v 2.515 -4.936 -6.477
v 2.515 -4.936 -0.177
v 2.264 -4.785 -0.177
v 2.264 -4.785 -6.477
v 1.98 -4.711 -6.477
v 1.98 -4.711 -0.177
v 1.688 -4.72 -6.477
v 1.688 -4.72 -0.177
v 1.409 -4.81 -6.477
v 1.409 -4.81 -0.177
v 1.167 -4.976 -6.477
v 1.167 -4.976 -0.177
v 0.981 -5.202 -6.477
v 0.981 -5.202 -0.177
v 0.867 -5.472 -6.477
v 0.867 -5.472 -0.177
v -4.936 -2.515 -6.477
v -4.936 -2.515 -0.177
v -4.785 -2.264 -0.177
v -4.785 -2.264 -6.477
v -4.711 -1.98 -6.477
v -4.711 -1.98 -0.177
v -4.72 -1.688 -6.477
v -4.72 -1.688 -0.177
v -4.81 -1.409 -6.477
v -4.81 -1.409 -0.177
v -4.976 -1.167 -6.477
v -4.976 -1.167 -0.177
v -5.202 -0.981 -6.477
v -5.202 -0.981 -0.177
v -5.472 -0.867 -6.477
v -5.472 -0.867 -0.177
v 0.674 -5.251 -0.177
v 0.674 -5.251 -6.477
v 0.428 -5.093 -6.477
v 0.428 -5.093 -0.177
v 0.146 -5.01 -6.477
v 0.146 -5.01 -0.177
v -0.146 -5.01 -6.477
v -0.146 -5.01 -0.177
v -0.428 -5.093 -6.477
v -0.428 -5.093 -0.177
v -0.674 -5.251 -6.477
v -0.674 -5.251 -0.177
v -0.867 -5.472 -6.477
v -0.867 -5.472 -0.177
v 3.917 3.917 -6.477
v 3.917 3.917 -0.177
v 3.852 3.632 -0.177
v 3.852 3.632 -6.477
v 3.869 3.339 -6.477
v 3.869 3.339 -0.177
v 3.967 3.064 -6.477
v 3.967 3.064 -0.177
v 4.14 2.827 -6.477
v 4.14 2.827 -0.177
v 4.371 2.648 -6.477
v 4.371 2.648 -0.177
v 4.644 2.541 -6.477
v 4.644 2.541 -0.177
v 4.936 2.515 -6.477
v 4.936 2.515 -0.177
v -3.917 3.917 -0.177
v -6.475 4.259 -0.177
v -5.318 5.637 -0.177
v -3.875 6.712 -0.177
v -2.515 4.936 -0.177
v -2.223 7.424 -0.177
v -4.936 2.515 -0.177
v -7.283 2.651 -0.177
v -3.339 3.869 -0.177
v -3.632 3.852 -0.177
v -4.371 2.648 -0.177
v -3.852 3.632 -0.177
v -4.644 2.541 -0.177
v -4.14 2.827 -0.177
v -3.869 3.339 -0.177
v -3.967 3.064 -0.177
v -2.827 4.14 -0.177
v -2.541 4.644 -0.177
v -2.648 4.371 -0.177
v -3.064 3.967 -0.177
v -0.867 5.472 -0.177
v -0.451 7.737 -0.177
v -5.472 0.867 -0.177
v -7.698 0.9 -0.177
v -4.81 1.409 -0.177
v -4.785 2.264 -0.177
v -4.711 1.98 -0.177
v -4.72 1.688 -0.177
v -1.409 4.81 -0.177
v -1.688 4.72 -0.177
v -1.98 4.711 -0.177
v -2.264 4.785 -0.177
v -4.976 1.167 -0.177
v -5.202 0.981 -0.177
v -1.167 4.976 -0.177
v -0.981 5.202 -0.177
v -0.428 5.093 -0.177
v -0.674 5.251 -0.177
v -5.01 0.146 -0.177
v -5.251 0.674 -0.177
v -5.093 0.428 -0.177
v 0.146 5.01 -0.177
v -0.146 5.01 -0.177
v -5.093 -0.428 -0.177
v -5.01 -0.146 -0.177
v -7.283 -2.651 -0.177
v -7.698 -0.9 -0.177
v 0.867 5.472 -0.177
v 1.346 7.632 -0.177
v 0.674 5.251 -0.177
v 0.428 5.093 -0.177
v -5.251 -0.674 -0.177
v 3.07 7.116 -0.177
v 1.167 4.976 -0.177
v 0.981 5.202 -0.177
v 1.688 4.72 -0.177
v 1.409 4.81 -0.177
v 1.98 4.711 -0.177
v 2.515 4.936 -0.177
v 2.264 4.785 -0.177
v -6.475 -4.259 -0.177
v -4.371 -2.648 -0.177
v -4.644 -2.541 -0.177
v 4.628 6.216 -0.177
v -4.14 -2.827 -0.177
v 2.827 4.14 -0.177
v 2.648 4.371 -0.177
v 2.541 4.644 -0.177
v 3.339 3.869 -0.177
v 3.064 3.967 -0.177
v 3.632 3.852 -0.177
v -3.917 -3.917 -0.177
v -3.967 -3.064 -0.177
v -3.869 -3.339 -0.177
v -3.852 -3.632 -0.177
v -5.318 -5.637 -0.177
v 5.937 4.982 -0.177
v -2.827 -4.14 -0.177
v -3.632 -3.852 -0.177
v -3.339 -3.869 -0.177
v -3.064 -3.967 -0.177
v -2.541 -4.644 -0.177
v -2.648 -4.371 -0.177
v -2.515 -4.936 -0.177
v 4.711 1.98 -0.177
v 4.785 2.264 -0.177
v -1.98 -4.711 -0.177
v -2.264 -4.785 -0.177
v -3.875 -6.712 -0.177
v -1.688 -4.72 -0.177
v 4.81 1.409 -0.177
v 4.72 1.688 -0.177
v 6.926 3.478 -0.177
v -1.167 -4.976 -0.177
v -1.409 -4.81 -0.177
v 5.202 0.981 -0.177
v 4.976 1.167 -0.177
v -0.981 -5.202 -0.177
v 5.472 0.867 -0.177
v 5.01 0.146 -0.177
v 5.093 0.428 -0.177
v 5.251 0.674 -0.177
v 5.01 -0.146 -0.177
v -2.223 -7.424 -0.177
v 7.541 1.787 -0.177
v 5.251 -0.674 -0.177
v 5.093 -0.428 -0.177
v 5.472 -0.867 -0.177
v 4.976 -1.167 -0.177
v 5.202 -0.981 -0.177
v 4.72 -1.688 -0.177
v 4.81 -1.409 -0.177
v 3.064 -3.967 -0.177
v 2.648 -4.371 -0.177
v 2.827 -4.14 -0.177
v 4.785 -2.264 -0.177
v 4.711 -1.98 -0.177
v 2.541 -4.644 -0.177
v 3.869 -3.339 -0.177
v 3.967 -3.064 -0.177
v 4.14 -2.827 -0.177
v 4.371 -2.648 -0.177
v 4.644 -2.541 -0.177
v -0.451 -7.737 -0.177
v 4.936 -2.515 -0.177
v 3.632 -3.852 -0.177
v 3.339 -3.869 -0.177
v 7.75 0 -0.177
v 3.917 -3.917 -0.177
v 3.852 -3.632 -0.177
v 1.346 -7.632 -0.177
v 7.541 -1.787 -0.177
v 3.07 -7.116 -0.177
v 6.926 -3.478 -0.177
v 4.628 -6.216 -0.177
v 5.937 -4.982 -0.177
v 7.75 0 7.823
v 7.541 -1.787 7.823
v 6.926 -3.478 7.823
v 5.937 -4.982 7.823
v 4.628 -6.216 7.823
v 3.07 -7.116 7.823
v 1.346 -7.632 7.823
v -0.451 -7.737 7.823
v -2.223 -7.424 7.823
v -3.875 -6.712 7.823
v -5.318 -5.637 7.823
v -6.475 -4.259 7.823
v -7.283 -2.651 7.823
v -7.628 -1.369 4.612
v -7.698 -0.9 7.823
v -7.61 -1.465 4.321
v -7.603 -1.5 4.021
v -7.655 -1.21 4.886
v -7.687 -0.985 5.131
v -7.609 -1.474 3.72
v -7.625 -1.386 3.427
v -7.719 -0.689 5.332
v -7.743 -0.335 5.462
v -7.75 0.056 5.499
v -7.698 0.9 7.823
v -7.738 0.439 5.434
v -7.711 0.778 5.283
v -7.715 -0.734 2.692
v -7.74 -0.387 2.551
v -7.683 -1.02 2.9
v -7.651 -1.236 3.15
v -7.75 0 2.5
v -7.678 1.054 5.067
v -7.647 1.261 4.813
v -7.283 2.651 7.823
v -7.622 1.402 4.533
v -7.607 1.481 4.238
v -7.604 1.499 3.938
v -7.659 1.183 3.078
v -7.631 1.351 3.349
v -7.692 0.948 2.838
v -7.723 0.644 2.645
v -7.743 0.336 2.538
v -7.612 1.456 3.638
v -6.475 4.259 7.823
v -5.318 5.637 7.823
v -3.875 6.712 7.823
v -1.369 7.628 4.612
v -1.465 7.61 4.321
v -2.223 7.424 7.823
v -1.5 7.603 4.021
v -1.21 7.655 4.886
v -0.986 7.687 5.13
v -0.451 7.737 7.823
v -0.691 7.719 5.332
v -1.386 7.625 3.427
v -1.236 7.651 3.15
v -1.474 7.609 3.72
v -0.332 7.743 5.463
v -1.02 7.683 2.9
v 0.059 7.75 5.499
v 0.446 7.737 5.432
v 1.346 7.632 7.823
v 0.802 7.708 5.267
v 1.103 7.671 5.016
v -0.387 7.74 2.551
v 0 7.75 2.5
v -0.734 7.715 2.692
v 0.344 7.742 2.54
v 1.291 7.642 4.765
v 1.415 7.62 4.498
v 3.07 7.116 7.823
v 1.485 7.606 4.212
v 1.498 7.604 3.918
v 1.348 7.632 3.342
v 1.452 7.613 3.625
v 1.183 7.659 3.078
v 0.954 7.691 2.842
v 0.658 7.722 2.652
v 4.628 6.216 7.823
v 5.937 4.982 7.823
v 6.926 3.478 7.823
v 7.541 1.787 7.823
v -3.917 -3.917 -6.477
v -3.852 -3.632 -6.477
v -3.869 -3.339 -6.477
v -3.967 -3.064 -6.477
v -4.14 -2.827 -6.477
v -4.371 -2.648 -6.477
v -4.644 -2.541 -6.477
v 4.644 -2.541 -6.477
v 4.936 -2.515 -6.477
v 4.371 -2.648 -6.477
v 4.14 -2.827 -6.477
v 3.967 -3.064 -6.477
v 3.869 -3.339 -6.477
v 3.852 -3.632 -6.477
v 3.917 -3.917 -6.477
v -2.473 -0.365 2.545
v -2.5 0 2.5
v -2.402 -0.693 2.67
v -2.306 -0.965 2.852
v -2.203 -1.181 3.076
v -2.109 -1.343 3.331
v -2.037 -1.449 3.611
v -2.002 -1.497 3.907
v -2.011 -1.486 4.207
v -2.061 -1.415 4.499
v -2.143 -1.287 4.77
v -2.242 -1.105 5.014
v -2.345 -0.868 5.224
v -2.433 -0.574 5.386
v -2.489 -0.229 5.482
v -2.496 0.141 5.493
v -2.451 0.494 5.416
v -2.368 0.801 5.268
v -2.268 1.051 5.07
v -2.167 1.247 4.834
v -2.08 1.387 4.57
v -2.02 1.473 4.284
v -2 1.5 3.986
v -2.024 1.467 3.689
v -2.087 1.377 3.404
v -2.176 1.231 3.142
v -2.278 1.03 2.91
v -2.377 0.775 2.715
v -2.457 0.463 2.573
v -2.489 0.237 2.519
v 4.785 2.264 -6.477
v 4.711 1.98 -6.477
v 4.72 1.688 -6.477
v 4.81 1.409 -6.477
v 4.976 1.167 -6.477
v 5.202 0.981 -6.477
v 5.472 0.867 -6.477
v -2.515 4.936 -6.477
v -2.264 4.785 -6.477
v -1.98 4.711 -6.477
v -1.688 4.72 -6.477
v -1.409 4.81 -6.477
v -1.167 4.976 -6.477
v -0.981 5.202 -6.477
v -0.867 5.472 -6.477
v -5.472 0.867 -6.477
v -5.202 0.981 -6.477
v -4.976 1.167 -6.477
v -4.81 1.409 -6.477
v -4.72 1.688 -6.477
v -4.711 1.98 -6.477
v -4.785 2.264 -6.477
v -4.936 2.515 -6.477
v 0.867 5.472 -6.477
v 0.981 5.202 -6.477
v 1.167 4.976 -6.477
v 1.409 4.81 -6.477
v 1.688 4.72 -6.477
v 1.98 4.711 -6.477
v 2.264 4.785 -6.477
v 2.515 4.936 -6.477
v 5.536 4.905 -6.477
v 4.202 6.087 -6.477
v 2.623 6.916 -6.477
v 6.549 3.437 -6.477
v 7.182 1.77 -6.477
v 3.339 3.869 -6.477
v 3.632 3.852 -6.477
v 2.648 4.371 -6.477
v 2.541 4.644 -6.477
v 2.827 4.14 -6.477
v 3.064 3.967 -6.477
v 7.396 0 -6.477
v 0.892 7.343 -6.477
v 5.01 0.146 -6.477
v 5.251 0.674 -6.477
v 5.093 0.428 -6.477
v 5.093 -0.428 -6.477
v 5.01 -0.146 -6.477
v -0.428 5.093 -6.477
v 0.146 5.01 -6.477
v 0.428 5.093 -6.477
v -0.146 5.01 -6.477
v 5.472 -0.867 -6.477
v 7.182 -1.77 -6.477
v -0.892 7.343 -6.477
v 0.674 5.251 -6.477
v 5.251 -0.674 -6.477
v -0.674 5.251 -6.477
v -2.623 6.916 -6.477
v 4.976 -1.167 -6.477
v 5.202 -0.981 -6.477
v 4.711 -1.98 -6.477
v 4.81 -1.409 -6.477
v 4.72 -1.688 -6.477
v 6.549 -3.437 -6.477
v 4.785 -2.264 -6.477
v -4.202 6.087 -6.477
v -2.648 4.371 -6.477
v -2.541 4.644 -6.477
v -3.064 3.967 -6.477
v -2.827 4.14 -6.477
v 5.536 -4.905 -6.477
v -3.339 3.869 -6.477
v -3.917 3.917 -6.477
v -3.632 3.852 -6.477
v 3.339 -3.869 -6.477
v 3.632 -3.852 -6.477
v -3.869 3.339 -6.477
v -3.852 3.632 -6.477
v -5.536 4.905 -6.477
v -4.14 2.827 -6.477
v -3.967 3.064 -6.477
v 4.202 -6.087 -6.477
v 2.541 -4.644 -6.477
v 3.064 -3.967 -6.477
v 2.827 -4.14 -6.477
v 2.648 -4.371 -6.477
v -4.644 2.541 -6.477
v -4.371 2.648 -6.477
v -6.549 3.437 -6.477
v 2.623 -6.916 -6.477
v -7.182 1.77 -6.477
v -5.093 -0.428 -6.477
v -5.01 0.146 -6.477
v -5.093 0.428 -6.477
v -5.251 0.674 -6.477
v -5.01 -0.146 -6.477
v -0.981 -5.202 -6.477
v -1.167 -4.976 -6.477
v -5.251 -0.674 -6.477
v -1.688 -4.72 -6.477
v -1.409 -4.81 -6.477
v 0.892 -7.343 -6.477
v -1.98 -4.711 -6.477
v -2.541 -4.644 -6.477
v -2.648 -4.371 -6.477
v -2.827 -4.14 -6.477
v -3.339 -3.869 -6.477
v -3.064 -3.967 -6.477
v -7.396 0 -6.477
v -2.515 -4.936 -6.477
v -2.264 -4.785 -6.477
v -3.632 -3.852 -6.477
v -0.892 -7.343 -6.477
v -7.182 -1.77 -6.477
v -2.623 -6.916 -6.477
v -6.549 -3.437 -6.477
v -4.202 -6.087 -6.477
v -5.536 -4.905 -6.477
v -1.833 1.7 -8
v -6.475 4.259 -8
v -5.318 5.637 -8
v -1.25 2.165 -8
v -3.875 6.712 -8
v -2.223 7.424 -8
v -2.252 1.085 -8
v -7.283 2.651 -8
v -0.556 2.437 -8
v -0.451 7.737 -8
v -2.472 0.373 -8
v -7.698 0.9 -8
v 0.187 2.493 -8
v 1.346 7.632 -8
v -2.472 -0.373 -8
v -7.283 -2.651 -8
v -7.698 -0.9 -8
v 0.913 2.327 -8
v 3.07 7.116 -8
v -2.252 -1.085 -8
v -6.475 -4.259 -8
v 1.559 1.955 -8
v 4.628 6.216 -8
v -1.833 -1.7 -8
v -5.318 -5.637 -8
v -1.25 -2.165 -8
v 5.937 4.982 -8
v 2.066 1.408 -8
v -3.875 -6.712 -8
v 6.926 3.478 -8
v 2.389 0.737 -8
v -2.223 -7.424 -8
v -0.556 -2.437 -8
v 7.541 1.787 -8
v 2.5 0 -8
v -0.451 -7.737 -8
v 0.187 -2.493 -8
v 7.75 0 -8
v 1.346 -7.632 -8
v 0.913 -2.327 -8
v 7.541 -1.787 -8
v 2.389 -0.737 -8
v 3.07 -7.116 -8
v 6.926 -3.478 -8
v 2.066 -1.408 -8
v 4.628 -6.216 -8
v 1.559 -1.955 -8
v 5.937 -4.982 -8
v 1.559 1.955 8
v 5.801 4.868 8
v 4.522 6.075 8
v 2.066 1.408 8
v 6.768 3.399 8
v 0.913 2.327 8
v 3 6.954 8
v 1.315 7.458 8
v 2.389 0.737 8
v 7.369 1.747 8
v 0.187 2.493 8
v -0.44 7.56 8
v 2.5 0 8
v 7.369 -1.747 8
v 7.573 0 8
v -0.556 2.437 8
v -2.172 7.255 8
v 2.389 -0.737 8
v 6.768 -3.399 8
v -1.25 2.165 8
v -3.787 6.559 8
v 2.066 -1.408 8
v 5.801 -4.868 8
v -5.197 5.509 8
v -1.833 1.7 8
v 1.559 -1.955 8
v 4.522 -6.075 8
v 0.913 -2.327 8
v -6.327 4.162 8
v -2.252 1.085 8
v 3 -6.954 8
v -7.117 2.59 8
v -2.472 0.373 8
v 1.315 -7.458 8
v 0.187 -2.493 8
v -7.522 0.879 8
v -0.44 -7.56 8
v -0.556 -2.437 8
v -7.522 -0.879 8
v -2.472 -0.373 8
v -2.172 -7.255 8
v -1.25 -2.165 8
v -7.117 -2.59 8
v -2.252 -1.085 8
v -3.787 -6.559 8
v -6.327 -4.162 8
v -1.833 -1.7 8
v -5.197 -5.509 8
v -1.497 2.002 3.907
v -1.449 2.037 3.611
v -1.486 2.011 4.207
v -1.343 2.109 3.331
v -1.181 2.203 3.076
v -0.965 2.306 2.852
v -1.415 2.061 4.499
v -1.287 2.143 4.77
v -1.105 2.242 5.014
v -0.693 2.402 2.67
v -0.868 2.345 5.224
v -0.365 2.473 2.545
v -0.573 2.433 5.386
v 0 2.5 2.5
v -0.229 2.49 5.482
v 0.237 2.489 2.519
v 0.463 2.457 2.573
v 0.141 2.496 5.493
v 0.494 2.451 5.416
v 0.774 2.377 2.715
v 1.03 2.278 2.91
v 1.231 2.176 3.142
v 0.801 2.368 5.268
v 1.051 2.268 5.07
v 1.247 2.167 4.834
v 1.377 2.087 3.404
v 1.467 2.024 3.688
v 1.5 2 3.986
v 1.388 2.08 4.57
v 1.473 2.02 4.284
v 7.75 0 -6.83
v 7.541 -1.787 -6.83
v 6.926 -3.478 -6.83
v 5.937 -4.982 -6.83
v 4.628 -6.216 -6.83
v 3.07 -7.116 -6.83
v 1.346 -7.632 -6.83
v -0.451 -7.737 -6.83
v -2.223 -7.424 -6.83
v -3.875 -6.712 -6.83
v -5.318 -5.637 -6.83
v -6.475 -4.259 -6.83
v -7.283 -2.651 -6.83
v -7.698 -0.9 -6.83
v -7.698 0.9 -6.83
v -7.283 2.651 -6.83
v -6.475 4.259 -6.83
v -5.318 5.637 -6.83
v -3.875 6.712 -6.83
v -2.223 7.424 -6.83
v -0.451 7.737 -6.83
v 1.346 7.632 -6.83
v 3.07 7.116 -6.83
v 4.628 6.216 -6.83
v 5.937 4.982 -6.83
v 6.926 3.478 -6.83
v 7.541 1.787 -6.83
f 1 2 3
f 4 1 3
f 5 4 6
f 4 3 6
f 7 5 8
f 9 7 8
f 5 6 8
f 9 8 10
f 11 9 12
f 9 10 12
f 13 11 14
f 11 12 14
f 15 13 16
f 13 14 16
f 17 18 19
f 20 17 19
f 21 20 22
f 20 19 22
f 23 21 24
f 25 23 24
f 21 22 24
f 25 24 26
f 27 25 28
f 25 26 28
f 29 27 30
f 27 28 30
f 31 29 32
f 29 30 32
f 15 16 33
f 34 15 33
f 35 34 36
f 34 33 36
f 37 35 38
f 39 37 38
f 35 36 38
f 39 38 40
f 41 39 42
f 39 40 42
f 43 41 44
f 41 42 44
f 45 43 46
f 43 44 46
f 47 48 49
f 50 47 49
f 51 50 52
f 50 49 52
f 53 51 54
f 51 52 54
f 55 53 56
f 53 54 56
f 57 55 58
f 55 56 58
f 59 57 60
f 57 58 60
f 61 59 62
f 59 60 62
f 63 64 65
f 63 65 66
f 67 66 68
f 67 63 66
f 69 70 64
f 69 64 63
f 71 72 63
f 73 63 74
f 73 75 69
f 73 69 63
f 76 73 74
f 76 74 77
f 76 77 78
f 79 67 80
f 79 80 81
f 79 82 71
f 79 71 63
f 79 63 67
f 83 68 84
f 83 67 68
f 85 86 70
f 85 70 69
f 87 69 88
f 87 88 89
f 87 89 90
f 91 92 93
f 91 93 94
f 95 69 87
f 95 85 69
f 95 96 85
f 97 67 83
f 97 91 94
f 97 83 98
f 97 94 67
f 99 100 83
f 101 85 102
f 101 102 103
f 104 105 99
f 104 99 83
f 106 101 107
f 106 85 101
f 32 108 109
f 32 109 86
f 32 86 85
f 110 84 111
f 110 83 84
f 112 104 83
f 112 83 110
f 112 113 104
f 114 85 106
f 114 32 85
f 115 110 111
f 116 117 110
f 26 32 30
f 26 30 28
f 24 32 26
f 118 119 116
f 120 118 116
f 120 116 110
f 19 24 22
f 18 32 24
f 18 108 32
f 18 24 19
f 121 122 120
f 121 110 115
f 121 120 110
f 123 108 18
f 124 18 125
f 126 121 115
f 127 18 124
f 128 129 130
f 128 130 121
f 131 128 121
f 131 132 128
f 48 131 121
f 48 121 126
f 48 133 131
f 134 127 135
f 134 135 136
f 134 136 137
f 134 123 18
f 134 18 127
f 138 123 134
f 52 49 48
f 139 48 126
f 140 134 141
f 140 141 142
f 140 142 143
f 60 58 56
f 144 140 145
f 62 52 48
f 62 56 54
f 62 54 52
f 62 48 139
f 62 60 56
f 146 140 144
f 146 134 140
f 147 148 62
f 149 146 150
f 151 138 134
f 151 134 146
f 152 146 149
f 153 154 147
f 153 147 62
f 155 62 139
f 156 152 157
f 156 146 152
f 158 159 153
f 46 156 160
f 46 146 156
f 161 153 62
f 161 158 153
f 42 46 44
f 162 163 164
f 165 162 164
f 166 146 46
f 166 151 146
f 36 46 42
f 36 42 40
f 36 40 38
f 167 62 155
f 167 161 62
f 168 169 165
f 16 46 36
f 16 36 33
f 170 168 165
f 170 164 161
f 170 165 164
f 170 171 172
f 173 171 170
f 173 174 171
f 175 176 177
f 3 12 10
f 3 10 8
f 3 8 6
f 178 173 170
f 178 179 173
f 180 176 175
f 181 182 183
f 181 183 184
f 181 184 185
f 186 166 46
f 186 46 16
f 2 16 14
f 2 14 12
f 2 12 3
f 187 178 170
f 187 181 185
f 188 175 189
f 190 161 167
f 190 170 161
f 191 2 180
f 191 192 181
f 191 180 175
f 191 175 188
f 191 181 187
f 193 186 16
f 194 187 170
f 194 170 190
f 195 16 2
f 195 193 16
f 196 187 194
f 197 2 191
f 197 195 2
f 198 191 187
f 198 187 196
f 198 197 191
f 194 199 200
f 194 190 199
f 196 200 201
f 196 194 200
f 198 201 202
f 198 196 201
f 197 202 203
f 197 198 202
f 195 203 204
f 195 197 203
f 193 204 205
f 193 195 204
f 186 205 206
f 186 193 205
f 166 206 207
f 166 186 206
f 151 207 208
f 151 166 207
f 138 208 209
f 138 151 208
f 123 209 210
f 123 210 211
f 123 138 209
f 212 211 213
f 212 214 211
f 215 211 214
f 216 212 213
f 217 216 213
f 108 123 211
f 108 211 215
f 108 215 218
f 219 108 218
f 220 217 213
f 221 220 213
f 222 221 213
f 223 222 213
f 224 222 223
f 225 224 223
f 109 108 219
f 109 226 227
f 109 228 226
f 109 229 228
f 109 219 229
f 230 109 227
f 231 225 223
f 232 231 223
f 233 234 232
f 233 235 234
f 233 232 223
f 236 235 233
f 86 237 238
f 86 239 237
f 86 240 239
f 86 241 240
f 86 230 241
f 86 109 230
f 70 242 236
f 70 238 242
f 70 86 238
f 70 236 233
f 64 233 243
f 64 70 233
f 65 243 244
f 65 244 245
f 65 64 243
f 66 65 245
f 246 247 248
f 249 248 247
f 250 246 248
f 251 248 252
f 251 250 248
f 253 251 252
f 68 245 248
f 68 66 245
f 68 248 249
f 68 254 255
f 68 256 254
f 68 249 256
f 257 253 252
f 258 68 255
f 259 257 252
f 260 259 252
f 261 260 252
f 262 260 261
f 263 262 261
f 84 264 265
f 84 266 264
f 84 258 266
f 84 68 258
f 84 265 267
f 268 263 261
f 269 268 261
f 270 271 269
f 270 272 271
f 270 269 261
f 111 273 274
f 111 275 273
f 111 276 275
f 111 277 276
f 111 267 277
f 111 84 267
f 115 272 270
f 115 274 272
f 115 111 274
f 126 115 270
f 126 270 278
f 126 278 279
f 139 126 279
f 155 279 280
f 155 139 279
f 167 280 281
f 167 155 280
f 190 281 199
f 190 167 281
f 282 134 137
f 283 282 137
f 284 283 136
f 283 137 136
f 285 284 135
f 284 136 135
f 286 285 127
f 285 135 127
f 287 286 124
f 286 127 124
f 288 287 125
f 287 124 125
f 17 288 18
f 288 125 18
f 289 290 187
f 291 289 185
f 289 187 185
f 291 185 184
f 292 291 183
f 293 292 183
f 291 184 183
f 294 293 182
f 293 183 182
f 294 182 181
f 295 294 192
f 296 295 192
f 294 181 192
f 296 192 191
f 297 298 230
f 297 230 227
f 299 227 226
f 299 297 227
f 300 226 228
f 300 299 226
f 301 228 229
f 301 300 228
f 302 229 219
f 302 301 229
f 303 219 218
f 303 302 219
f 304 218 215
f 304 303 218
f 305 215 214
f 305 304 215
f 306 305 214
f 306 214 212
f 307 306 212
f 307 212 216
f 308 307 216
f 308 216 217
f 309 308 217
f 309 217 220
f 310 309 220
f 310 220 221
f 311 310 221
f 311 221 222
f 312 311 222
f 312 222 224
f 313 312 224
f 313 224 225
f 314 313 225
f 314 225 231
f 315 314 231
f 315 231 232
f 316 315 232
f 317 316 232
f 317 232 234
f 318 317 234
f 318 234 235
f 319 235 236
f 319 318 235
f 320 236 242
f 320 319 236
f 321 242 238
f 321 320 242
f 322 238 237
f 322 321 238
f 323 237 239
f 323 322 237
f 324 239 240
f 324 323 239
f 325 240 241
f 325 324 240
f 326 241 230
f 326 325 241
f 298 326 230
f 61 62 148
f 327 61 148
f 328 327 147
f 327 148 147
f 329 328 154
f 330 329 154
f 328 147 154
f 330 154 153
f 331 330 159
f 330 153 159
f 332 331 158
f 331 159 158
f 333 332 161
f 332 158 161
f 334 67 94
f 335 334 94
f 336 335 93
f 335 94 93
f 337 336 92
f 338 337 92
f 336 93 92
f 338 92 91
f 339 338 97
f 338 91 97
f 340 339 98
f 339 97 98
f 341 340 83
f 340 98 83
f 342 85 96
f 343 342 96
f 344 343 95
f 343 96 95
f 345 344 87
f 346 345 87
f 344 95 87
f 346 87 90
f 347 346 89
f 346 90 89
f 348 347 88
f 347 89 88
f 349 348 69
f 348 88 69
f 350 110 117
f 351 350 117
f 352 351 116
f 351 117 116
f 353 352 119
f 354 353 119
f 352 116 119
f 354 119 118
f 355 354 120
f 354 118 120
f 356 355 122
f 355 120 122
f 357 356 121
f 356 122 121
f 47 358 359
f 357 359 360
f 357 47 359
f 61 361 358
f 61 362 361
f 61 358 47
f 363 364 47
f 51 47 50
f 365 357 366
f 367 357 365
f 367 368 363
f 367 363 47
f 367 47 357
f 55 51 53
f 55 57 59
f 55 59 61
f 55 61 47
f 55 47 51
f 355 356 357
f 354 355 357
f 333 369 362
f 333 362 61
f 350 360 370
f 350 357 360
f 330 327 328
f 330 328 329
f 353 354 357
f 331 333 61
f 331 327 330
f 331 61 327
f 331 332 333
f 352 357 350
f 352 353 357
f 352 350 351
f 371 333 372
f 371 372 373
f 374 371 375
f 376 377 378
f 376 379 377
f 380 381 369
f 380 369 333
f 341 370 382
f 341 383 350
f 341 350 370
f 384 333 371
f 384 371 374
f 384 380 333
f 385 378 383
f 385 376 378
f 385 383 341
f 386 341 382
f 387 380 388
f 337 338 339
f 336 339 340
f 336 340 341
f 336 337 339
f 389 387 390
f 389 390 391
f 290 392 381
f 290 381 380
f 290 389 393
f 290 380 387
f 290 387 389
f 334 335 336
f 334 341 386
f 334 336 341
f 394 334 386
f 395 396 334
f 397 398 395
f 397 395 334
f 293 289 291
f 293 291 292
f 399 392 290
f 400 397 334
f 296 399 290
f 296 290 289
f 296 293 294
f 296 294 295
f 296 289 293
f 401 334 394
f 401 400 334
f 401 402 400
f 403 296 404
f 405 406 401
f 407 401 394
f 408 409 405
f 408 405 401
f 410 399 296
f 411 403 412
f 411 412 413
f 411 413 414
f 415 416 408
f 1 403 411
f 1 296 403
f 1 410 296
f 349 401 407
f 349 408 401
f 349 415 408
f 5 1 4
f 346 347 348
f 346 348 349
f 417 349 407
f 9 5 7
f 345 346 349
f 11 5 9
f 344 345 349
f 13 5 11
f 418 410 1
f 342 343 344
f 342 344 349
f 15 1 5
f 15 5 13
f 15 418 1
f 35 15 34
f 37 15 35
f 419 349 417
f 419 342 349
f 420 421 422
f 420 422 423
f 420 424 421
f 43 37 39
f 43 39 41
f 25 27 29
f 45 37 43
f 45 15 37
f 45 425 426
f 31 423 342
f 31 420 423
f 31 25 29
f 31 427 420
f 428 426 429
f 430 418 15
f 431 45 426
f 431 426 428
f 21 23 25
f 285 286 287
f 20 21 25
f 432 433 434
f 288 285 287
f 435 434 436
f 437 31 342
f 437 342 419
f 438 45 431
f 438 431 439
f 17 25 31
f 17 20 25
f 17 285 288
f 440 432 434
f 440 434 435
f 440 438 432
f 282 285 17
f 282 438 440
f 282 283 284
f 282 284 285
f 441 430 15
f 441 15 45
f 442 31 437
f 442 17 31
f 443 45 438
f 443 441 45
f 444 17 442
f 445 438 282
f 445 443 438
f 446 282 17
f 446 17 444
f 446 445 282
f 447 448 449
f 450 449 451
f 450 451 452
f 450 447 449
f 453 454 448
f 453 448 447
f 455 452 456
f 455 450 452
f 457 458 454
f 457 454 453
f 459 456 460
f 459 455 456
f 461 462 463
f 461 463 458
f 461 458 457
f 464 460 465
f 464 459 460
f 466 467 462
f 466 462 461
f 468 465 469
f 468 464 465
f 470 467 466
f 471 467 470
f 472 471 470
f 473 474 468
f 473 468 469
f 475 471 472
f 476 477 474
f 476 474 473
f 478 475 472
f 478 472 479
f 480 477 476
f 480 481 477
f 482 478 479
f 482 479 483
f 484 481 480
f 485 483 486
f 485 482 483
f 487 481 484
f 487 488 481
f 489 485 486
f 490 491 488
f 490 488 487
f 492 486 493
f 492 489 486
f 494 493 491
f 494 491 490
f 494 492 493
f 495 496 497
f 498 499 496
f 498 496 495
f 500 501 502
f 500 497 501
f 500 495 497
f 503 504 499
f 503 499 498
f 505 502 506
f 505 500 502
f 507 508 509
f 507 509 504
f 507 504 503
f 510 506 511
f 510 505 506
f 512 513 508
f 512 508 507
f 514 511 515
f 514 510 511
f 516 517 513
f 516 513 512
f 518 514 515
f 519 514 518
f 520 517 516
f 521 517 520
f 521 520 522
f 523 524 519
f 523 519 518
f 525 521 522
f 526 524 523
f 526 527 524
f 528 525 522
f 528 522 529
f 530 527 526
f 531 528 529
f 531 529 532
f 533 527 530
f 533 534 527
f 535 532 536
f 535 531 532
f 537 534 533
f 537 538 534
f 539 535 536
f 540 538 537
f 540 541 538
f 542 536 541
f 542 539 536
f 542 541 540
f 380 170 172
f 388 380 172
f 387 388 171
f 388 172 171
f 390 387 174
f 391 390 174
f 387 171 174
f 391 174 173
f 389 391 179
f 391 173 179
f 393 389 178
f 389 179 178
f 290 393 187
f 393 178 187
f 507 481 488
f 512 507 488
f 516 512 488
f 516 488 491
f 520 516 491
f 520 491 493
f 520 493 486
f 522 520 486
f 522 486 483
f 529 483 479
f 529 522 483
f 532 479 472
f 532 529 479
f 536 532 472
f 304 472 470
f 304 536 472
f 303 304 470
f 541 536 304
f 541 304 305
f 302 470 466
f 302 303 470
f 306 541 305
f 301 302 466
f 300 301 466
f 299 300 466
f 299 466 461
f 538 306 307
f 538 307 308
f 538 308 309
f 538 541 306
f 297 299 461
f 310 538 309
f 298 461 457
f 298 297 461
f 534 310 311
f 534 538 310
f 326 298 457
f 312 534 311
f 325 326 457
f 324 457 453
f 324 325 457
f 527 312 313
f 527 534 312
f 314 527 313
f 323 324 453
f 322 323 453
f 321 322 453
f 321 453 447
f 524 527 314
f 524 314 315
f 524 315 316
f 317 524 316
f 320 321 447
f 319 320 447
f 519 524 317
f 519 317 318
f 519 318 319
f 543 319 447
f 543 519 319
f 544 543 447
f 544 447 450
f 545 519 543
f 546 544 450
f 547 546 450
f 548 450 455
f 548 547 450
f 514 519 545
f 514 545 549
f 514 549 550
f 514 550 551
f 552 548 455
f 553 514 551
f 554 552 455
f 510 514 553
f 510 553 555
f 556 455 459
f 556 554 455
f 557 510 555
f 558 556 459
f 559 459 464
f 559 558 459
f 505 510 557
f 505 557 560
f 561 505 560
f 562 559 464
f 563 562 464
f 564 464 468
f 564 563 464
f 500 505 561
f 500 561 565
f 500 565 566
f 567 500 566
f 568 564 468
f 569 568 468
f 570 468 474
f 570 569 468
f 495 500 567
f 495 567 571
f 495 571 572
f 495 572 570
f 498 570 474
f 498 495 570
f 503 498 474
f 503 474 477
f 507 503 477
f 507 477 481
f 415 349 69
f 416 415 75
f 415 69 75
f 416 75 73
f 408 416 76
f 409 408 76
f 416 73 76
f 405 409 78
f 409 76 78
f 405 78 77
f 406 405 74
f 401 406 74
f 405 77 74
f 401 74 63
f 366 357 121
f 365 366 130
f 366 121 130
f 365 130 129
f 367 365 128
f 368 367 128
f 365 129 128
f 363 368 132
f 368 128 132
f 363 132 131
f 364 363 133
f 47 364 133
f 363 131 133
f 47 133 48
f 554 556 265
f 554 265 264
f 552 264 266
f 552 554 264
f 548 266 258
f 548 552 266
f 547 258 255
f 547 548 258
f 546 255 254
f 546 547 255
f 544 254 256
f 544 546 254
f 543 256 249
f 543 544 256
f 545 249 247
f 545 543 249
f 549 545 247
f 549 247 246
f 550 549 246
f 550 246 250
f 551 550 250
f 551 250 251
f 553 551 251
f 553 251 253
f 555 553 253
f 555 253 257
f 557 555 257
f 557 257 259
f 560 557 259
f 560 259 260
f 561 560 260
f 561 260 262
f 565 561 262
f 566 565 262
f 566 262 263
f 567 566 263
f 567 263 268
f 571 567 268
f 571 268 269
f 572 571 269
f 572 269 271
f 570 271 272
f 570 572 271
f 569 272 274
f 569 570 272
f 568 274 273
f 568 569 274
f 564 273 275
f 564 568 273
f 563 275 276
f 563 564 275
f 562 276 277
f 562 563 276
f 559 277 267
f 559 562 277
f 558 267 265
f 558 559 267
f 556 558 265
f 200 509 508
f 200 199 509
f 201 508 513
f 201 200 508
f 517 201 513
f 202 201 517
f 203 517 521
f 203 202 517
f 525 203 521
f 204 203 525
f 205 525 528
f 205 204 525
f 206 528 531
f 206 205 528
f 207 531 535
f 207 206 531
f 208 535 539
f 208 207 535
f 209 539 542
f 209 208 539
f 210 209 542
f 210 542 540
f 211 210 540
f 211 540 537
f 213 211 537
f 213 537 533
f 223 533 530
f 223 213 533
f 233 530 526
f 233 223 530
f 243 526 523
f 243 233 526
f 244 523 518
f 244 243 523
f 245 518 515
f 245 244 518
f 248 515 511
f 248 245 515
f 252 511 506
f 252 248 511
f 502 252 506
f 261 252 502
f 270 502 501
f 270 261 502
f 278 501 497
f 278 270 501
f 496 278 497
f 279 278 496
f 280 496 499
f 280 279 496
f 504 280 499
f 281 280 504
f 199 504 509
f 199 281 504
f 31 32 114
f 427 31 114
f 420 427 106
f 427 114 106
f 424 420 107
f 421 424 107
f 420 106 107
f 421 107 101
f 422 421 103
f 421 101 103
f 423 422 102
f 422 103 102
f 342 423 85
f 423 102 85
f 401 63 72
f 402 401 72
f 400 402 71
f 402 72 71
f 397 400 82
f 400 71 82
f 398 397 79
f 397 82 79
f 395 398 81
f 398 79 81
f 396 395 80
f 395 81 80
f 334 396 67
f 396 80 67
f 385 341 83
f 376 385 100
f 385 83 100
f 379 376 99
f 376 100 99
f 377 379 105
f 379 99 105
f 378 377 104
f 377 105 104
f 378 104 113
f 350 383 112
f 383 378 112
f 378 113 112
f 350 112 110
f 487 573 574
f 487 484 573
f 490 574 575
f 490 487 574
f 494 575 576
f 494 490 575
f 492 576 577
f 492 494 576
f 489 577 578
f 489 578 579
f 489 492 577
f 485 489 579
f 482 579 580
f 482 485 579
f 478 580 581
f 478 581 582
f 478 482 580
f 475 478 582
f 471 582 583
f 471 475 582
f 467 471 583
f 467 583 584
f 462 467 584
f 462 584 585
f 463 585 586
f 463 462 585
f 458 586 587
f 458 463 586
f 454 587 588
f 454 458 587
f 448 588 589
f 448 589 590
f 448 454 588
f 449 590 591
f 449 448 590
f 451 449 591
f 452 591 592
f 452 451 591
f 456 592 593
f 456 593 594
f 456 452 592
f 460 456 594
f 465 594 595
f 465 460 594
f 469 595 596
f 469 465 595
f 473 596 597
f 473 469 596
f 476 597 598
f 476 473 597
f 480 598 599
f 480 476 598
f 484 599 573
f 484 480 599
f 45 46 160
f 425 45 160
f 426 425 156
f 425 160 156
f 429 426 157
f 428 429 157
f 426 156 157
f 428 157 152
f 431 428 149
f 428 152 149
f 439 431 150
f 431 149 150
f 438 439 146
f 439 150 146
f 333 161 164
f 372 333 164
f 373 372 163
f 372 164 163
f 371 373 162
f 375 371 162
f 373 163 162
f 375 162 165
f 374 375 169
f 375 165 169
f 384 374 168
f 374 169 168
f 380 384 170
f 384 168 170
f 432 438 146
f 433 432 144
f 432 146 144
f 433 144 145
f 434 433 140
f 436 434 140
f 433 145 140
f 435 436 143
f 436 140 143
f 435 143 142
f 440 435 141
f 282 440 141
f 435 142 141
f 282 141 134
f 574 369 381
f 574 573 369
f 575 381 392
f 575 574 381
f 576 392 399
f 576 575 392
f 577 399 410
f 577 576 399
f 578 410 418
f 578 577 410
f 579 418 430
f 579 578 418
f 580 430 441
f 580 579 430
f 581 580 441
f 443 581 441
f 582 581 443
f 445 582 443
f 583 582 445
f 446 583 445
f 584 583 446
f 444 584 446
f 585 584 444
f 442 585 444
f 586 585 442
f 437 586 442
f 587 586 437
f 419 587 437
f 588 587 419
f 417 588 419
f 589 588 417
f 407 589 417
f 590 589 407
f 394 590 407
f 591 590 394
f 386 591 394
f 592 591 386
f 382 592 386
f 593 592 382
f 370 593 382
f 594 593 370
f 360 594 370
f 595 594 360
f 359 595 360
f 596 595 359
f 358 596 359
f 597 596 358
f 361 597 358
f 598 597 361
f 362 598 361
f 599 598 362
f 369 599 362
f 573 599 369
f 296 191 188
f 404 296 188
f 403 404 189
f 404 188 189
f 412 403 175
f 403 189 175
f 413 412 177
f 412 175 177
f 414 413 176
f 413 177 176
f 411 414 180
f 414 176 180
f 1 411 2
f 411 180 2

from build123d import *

# Parameters (mm, degrees)
SKETCH2_R           = 1.5
CUT_EXTRUDE1_DEPTH  = 29
CIRPATTERN1_COUNT   = 2
CIRPATTERN1_ANGLE   = 90
BOSS_EXTRUDE1_START = 6.3
SKETCH3_R           = 2.5
BOSS_EXTRUDE1_DEPTH = 6.3


with BuildPart() as part:
    # Sketch1 → Revolve1 (revolve)
    with BuildSketch(Plane(origin=(0, 0, 0), x_dir=(0, 0, -1), z_dir=(1, 0, 0)), mode=Mode.PRIVATE) as revolve1_sk:
        Polygon((-7.823223305, 7.75), (0.176776695, 7.75), (0.176776695, 5), (6.476776695, 5), (6.476776695, 7.396446609), (6.830330086, 7.75), (8, 7.75), (8, 2.5), (-8, 2.5), (-8, 7.573223305), align=None)
    revolve(revolve1_sk.sketch.rotate(Axis((0, 0, 8), (0, 0, -1)), 90), axis=Axis((0, 0, 8), (0, 0, -1)))

    # Sketch2 → Cut-Extrude1 (cut)
    with BuildSketch(Plane(origin=(0, 0, 0), x_dir=(1, 0, 0), z_dir=(0, 1, 0))):
        with Locations(Location((0, -4, 0), (0, 0, 90))):
            Circle(SKETCH2_R)
    cut_extrude1 = extrude(amount=CUT_EXTRUDE1_DEPTH, mode=Mode.SUBTRACT)

    # CirPattern1: Cut-Extrude1 ×2 about axis
    cirpattern1_axis = Axis((0, 0, 8), (0, 0, 1))
    for i in range(1, CIRPATTERN1_COUNT):
        add(cut_extrude1.rotate(cirpattern1_axis, i * CIRPATTERN1_ANGLE / (CIRPATTERN1_COUNT - 1)), mode=Mode.SUBTRACT)

    # Sketch3 → Boss-Extrude1 (add)
    with BuildSketch(Plane.XY.offset(-6.476776695).offset(BOSS_EXTRUDE1_START)):
        with BuildLine():
            ThreePointArc((-0.866608796, 5.471552596), (0, 5), (0.866608796, 5.471552596))
            ThreePointArc((0.866608796, 5.471552596), (1.545084972, 4.755282581), (2.51499668, 4.935958906))
            ThreePointArc((2.51499668, 4.935958906), (2.938926261, 4.045084972), (3.917199167, 3.917199167))
            ThreePointArc((3.917199167, 3.917199167), (4.045084972, 2.938926261), (4.935958906, 2.51499668))
            ThreePointArc((4.935958906, 2.51499668), (4.755282581, 1.545084972), (5.471552596, 0.866608796))
            ThreePointArc((5.471552596, 0.866608796), (5, 0), (5.471552596, -0.866608796))
            ThreePointArc((5.471552596, -0.866608796), (4.755282581, -1.545084972), (4.935958906, -2.51499668))
            ThreePointArc((4.935958906, -2.51499668), (4.045084972, -2.938926261), (3.917199167, -3.917199167))
            ThreePointArc((3.917199167, -3.917199167), (2.938926261, -4.045084972), (2.51499668, -4.935958906))
            ThreePointArc((2.51499668, -4.935958906), (1.545084972, -4.755282581), (0.866608796, -5.471552596))
            ThreePointArc((0.866608796, -5.471552596), (0, -5), (-0.866608796, -5.471552596))
            ThreePointArc((-0.866608796, -5.471552596), (-1.545084972, -4.755282581), (-2.51499668, -4.935958906))
            ThreePointArc((-2.51499668, -4.935958906), (-2.938926261, -4.045084972), (-3.917199167, -3.917199167))
            ThreePointArc((-3.917199167, -3.917199167), (-4.045084972, -2.938926261), (-4.935958906, -2.51499668))
            ThreePointArc((-4.935958906, -2.51499668), (-4.755282581, -1.545084972), (-5.471552596, -0.866608796))
            ThreePointArc((-5.471552596, -0.866608796), (-5, 0), (-5.471552596, 0.866608796))
            ThreePointArc((-5.471552596, 0.866608796), (-4.755282581, 1.545084972), (-4.935958906, 2.51499668))
            ThreePointArc((-4.935958906, 2.51499668), (-4.045084972, 2.938926261), (-3.917199167, 3.917199167))
            ThreePointArc((-3.917199167, 3.917199167), (-2.938926261, 4.045084972), (-2.51499668, 4.935958906))
            ThreePointArc((-2.51499668, 4.935958906), (-1.545084972, 4.755282581), (-0.866608796, 5.471552596))
        make_face()
        Circle(SKETCH3_R, mode=Mode.SUBTRACT)
    extrude(amount=-BOSS_EXTRUDE1_DEPTH)


solid = part.part
